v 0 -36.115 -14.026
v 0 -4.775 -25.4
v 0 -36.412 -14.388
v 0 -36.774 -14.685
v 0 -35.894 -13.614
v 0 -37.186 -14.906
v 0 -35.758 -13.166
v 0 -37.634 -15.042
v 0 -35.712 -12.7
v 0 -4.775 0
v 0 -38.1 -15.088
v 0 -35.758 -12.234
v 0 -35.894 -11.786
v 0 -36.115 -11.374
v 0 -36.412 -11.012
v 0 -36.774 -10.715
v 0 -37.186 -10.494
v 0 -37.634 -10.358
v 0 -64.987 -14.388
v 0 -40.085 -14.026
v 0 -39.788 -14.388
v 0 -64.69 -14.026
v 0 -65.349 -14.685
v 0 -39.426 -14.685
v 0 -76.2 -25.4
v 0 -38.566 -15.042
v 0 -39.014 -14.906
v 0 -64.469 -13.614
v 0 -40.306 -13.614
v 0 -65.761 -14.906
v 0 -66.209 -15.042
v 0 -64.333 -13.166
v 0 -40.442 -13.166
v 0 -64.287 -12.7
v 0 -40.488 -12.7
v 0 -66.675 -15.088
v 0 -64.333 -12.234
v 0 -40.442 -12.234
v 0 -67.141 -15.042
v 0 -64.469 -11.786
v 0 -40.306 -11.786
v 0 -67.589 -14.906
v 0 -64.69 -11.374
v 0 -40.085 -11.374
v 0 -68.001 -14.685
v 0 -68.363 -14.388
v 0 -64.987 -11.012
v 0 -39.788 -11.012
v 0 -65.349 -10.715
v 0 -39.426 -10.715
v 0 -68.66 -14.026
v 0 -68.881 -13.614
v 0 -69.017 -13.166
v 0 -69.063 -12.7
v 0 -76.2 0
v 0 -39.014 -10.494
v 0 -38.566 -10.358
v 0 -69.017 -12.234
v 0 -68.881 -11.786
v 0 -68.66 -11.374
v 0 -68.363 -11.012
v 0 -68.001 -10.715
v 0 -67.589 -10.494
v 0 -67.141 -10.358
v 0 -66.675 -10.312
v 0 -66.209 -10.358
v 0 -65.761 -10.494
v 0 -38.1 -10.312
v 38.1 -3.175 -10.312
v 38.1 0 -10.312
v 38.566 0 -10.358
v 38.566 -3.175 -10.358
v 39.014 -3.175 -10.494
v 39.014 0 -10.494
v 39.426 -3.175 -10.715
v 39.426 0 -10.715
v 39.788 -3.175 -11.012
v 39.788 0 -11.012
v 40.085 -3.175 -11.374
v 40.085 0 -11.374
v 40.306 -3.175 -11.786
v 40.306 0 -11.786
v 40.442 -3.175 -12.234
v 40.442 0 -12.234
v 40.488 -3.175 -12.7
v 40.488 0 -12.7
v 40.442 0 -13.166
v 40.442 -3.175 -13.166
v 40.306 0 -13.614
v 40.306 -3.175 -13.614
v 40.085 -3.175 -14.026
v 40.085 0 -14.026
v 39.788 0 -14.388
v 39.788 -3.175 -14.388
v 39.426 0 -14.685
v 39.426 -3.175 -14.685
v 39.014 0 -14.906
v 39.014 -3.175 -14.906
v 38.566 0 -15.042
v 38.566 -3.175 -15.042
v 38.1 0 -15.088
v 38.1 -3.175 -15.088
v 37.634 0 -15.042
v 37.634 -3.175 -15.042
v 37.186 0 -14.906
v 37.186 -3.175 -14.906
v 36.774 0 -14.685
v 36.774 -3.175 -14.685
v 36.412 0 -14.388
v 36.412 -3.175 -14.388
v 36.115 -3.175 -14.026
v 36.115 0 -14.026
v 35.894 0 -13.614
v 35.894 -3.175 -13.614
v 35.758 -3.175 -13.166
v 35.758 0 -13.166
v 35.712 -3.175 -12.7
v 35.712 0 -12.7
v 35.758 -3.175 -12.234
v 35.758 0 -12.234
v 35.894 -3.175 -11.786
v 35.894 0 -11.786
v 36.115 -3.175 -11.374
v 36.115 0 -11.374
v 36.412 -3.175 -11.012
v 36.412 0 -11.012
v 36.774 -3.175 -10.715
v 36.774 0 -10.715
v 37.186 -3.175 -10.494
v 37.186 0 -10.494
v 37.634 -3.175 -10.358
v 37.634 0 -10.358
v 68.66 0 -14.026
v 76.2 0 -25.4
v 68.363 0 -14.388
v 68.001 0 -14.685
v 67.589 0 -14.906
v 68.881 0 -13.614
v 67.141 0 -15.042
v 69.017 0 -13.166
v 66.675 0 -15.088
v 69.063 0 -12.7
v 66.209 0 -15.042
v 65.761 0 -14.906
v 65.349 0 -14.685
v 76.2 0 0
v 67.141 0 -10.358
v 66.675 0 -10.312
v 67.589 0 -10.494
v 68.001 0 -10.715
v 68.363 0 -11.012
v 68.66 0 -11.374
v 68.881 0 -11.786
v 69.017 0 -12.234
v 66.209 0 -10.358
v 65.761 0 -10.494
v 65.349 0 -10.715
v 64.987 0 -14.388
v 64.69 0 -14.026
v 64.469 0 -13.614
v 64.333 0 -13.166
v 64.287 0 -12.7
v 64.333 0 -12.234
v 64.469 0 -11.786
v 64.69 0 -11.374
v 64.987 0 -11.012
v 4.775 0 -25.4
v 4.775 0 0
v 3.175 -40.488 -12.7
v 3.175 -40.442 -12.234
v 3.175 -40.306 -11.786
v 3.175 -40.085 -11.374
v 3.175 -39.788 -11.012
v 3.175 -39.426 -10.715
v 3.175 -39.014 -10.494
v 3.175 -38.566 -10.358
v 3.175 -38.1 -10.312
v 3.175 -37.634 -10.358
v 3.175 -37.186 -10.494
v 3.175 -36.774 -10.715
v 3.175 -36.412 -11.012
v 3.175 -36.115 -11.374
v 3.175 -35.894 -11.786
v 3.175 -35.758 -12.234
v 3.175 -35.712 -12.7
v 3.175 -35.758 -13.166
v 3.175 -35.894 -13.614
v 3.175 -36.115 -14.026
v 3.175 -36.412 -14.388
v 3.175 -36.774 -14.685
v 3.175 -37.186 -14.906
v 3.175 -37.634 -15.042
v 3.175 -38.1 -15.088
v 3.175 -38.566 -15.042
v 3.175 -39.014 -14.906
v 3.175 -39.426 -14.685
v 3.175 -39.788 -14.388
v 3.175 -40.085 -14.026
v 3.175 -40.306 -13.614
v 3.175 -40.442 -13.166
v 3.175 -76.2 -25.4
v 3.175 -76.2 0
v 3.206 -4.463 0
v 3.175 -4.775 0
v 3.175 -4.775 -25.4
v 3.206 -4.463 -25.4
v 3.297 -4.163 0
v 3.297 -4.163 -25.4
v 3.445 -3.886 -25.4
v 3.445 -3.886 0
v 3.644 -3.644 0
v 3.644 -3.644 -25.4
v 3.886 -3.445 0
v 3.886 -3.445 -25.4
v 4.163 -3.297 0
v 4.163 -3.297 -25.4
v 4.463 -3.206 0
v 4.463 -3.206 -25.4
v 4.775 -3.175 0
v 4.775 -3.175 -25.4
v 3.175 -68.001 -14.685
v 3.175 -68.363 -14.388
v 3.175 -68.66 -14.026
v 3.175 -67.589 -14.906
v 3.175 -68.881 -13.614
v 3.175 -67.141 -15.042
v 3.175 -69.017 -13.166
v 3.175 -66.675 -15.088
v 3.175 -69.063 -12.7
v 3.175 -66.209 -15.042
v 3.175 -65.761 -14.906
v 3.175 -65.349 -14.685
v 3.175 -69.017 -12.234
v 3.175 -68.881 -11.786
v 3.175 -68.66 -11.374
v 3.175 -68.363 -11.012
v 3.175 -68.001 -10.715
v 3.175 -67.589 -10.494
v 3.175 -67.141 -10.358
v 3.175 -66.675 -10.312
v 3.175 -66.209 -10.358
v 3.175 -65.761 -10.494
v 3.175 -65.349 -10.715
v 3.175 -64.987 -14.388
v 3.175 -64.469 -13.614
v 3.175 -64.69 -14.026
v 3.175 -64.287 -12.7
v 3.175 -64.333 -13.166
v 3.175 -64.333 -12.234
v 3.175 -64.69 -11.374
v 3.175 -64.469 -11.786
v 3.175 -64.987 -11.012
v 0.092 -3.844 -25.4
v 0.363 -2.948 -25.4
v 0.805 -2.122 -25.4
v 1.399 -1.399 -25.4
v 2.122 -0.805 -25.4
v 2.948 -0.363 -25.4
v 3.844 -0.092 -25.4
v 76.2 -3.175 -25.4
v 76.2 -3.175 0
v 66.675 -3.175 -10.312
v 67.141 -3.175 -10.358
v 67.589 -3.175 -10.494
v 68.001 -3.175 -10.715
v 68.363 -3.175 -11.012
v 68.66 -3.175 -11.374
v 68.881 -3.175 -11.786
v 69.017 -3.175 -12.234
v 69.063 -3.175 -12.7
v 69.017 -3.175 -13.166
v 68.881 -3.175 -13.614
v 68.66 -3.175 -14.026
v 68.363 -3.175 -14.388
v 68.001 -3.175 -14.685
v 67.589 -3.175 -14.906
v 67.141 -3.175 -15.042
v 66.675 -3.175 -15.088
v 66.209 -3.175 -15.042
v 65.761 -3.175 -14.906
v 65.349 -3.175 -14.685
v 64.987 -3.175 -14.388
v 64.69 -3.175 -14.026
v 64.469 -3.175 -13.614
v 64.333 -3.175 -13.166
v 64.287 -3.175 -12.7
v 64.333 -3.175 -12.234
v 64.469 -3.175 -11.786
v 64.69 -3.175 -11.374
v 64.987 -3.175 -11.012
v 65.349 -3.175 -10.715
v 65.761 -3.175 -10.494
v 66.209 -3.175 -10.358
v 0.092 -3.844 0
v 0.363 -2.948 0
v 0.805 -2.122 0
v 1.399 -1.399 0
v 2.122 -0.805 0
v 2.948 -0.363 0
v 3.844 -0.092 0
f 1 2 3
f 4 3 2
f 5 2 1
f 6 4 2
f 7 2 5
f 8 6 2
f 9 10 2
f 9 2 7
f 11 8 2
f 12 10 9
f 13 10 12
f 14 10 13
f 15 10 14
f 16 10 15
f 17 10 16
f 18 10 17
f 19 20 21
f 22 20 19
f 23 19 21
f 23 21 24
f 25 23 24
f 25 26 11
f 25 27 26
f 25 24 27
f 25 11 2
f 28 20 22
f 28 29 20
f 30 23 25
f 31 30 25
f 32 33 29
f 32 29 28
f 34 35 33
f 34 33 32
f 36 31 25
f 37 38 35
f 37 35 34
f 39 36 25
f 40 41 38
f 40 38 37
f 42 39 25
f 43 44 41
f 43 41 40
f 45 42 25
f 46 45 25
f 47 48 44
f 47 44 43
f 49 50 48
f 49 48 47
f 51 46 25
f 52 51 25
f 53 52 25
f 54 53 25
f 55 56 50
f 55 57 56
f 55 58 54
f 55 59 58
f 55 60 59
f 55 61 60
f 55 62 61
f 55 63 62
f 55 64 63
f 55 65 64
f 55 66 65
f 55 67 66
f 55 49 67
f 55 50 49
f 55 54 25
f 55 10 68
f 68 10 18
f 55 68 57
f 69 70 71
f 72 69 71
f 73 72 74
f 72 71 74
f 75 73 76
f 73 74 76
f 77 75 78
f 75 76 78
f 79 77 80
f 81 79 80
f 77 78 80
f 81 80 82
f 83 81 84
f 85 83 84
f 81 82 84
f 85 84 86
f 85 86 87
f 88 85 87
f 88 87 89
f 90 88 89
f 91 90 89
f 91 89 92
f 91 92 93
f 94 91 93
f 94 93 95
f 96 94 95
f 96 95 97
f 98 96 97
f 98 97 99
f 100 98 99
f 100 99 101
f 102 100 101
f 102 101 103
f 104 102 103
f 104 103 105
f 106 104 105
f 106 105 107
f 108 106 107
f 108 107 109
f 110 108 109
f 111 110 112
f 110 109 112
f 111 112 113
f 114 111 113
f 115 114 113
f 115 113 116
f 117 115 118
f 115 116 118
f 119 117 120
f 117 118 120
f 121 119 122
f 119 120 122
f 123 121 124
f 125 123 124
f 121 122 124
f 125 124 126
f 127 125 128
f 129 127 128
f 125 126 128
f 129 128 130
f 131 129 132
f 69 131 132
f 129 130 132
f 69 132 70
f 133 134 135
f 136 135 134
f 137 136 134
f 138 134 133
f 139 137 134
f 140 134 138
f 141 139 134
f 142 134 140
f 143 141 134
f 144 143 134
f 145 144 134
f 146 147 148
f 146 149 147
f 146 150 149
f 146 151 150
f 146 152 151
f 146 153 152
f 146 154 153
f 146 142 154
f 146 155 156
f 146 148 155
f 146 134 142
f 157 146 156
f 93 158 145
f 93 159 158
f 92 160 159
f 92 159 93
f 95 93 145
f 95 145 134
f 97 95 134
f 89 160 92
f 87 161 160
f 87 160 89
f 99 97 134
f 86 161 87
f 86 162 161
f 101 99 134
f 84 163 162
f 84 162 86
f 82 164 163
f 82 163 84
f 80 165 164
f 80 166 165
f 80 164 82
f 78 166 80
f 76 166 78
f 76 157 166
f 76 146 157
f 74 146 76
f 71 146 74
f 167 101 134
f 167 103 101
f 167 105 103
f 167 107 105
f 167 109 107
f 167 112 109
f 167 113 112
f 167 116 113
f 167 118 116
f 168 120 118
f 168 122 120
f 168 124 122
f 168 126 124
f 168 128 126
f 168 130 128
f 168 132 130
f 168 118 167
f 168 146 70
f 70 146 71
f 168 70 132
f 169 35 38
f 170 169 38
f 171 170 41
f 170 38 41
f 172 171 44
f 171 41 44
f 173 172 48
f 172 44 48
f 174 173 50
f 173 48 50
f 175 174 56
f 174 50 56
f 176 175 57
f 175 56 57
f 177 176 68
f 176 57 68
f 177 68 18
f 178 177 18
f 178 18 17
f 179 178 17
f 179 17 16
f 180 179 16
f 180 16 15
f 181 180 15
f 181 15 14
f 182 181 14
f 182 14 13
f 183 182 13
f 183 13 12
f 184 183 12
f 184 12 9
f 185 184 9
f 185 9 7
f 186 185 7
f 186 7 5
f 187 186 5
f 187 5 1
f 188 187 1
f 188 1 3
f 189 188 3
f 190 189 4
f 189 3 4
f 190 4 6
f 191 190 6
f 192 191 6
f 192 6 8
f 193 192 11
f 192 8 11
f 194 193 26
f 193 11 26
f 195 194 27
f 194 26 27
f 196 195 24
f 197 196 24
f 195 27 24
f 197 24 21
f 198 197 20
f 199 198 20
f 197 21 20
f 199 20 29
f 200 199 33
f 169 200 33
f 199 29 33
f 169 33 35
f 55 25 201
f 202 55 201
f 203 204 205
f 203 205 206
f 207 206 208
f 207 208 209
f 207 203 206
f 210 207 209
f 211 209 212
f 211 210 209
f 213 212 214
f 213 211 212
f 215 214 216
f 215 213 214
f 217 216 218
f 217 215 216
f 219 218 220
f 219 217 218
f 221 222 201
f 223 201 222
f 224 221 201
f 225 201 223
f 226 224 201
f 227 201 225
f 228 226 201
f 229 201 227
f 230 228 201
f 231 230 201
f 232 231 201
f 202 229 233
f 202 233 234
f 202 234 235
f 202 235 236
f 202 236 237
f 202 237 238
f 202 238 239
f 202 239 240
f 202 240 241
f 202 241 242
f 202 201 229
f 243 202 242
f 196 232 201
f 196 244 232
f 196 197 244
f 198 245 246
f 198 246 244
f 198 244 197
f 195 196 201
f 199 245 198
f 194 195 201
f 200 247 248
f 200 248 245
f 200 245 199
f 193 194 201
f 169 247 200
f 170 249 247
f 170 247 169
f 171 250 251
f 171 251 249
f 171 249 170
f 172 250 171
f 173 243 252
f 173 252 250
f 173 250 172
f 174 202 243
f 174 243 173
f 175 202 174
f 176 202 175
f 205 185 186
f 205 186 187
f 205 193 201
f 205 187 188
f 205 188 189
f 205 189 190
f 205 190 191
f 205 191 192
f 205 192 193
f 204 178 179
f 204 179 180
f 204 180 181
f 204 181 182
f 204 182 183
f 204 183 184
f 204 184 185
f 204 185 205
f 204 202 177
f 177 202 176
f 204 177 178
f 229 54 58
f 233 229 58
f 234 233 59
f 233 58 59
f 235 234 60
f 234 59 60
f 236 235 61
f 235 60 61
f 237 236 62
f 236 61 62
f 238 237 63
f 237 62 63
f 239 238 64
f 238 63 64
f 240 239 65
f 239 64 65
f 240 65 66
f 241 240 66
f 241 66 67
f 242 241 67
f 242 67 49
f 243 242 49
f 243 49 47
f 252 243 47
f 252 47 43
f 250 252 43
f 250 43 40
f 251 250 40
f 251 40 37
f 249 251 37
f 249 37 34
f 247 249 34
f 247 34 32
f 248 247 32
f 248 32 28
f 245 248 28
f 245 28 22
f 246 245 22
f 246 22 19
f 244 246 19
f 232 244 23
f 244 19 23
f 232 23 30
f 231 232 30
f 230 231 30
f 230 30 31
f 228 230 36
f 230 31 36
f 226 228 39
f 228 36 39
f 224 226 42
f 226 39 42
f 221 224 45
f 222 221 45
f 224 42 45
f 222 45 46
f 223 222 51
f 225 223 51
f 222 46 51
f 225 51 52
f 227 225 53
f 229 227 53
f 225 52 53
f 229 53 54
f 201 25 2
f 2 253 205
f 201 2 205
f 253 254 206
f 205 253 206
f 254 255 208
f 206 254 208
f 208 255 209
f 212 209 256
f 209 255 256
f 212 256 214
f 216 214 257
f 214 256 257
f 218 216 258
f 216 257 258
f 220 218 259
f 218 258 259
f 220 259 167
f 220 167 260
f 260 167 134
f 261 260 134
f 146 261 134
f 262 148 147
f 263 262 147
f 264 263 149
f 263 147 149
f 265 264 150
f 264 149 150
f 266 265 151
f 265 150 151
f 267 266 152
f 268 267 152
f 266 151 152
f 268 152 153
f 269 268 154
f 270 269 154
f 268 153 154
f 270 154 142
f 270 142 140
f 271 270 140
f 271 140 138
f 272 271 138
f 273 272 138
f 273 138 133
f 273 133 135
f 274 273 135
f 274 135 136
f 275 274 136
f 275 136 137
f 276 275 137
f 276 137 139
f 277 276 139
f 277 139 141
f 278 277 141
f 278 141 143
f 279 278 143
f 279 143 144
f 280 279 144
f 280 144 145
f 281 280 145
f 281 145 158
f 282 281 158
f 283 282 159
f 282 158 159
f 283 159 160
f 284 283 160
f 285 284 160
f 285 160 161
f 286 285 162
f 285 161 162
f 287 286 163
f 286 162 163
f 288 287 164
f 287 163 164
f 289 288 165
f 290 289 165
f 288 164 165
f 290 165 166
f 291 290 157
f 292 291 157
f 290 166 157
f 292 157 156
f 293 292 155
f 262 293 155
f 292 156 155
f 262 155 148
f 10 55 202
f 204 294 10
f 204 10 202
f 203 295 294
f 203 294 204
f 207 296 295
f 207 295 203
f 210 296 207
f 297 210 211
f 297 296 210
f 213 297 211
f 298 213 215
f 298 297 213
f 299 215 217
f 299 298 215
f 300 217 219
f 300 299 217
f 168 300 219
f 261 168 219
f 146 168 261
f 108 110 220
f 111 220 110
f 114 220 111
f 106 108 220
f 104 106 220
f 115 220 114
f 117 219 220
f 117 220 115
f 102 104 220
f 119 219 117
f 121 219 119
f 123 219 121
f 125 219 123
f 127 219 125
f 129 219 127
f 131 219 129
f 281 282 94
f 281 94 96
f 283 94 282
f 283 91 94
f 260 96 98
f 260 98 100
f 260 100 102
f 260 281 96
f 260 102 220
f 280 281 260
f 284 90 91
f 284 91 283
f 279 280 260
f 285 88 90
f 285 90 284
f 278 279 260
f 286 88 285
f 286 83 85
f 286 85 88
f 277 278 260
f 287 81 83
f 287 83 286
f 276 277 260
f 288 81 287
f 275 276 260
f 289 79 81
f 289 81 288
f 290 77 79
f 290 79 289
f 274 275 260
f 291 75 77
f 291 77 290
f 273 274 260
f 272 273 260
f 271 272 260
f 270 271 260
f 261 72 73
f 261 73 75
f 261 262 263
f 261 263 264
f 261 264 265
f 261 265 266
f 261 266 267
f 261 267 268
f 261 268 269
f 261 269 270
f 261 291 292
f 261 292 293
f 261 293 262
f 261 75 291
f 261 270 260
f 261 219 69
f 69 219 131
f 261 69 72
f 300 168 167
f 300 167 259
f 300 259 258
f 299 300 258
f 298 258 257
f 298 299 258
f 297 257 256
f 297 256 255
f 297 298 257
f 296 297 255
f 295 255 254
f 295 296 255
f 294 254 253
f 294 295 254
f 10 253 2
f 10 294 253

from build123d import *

# Parameters (mm, degrees)
BASE_FLANGE1_DEPTH = 25.4
SKETCH3_R          = 2.3876
CUT_EXTRUDE1_DEPTH = 5.08
SKETCH4_R          = 2.3876
CUT_EXTRUDE2_DEPTH = 5.08


# Sheet-metal steps are written as plain solids
with BuildPart() as part:
    # Sketch1 → Base-Flange1 (new body)
    with BuildSketch(Plane.XY):
        with BuildLine():
            Line((76.2, 0), (4.7752, 0))
            ThreePointArc((4.7752, 0), (1.398623698, -1.398623698), (0, -4.7752))
            Line((0, -4.7752), (0, -76.2))
            Line((0, -76.2), (3.175, -76.2))
            Line((3.175, -76.2), (3.175, -4.7752))
            ThreePointArc((3.175, -4.7752), (3.643687729, -3.643687729), (4.7752, -3.175))
            Line((4.7752, -3.175), (76.2, -3.175))
            Line((76.2, -3.175), (76.2, 0))
        make_face()
    extrude(amount=-BASE_FLANGE1_DEPTH)

    # Sketch3 → Cut-Extrude1 (cut)
    with BuildSketch(Plane(origin=(0, 0, 0), x_dir=(-1, 0, 0), z_dir=(0, 1, 0))):
        with Locations(Location((-66.675, -12.7, 0), (0, 0, 90))):
            Circle(SKETCH3_R)
        with Locations(Location((-38.1, -12.7, 0), (0, 0, 90))):
            Circle(SKETCH3_R)
    extrude(amount=-CUT_EXTRUDE1_DEPTH, mode=Mode.SUBTRACT)

    # Sketch4 → Cut-Extrude2 (cut)
    with BuildSketch(Plane.ZY):
        with Locations(Location((-12.7, -66.675, 0), (0, 0, 270))):
            Circle(SKETCH4_R)
        with Locations(Location((-12.7, -38.1, 0), (0, 0, 270))):
            Circle(SKETCH4_R)
    extrude(amount=-CUT_EXTRUDE2_DEPTH, mode=Mode.SUBTRACT)


solid = part.part
